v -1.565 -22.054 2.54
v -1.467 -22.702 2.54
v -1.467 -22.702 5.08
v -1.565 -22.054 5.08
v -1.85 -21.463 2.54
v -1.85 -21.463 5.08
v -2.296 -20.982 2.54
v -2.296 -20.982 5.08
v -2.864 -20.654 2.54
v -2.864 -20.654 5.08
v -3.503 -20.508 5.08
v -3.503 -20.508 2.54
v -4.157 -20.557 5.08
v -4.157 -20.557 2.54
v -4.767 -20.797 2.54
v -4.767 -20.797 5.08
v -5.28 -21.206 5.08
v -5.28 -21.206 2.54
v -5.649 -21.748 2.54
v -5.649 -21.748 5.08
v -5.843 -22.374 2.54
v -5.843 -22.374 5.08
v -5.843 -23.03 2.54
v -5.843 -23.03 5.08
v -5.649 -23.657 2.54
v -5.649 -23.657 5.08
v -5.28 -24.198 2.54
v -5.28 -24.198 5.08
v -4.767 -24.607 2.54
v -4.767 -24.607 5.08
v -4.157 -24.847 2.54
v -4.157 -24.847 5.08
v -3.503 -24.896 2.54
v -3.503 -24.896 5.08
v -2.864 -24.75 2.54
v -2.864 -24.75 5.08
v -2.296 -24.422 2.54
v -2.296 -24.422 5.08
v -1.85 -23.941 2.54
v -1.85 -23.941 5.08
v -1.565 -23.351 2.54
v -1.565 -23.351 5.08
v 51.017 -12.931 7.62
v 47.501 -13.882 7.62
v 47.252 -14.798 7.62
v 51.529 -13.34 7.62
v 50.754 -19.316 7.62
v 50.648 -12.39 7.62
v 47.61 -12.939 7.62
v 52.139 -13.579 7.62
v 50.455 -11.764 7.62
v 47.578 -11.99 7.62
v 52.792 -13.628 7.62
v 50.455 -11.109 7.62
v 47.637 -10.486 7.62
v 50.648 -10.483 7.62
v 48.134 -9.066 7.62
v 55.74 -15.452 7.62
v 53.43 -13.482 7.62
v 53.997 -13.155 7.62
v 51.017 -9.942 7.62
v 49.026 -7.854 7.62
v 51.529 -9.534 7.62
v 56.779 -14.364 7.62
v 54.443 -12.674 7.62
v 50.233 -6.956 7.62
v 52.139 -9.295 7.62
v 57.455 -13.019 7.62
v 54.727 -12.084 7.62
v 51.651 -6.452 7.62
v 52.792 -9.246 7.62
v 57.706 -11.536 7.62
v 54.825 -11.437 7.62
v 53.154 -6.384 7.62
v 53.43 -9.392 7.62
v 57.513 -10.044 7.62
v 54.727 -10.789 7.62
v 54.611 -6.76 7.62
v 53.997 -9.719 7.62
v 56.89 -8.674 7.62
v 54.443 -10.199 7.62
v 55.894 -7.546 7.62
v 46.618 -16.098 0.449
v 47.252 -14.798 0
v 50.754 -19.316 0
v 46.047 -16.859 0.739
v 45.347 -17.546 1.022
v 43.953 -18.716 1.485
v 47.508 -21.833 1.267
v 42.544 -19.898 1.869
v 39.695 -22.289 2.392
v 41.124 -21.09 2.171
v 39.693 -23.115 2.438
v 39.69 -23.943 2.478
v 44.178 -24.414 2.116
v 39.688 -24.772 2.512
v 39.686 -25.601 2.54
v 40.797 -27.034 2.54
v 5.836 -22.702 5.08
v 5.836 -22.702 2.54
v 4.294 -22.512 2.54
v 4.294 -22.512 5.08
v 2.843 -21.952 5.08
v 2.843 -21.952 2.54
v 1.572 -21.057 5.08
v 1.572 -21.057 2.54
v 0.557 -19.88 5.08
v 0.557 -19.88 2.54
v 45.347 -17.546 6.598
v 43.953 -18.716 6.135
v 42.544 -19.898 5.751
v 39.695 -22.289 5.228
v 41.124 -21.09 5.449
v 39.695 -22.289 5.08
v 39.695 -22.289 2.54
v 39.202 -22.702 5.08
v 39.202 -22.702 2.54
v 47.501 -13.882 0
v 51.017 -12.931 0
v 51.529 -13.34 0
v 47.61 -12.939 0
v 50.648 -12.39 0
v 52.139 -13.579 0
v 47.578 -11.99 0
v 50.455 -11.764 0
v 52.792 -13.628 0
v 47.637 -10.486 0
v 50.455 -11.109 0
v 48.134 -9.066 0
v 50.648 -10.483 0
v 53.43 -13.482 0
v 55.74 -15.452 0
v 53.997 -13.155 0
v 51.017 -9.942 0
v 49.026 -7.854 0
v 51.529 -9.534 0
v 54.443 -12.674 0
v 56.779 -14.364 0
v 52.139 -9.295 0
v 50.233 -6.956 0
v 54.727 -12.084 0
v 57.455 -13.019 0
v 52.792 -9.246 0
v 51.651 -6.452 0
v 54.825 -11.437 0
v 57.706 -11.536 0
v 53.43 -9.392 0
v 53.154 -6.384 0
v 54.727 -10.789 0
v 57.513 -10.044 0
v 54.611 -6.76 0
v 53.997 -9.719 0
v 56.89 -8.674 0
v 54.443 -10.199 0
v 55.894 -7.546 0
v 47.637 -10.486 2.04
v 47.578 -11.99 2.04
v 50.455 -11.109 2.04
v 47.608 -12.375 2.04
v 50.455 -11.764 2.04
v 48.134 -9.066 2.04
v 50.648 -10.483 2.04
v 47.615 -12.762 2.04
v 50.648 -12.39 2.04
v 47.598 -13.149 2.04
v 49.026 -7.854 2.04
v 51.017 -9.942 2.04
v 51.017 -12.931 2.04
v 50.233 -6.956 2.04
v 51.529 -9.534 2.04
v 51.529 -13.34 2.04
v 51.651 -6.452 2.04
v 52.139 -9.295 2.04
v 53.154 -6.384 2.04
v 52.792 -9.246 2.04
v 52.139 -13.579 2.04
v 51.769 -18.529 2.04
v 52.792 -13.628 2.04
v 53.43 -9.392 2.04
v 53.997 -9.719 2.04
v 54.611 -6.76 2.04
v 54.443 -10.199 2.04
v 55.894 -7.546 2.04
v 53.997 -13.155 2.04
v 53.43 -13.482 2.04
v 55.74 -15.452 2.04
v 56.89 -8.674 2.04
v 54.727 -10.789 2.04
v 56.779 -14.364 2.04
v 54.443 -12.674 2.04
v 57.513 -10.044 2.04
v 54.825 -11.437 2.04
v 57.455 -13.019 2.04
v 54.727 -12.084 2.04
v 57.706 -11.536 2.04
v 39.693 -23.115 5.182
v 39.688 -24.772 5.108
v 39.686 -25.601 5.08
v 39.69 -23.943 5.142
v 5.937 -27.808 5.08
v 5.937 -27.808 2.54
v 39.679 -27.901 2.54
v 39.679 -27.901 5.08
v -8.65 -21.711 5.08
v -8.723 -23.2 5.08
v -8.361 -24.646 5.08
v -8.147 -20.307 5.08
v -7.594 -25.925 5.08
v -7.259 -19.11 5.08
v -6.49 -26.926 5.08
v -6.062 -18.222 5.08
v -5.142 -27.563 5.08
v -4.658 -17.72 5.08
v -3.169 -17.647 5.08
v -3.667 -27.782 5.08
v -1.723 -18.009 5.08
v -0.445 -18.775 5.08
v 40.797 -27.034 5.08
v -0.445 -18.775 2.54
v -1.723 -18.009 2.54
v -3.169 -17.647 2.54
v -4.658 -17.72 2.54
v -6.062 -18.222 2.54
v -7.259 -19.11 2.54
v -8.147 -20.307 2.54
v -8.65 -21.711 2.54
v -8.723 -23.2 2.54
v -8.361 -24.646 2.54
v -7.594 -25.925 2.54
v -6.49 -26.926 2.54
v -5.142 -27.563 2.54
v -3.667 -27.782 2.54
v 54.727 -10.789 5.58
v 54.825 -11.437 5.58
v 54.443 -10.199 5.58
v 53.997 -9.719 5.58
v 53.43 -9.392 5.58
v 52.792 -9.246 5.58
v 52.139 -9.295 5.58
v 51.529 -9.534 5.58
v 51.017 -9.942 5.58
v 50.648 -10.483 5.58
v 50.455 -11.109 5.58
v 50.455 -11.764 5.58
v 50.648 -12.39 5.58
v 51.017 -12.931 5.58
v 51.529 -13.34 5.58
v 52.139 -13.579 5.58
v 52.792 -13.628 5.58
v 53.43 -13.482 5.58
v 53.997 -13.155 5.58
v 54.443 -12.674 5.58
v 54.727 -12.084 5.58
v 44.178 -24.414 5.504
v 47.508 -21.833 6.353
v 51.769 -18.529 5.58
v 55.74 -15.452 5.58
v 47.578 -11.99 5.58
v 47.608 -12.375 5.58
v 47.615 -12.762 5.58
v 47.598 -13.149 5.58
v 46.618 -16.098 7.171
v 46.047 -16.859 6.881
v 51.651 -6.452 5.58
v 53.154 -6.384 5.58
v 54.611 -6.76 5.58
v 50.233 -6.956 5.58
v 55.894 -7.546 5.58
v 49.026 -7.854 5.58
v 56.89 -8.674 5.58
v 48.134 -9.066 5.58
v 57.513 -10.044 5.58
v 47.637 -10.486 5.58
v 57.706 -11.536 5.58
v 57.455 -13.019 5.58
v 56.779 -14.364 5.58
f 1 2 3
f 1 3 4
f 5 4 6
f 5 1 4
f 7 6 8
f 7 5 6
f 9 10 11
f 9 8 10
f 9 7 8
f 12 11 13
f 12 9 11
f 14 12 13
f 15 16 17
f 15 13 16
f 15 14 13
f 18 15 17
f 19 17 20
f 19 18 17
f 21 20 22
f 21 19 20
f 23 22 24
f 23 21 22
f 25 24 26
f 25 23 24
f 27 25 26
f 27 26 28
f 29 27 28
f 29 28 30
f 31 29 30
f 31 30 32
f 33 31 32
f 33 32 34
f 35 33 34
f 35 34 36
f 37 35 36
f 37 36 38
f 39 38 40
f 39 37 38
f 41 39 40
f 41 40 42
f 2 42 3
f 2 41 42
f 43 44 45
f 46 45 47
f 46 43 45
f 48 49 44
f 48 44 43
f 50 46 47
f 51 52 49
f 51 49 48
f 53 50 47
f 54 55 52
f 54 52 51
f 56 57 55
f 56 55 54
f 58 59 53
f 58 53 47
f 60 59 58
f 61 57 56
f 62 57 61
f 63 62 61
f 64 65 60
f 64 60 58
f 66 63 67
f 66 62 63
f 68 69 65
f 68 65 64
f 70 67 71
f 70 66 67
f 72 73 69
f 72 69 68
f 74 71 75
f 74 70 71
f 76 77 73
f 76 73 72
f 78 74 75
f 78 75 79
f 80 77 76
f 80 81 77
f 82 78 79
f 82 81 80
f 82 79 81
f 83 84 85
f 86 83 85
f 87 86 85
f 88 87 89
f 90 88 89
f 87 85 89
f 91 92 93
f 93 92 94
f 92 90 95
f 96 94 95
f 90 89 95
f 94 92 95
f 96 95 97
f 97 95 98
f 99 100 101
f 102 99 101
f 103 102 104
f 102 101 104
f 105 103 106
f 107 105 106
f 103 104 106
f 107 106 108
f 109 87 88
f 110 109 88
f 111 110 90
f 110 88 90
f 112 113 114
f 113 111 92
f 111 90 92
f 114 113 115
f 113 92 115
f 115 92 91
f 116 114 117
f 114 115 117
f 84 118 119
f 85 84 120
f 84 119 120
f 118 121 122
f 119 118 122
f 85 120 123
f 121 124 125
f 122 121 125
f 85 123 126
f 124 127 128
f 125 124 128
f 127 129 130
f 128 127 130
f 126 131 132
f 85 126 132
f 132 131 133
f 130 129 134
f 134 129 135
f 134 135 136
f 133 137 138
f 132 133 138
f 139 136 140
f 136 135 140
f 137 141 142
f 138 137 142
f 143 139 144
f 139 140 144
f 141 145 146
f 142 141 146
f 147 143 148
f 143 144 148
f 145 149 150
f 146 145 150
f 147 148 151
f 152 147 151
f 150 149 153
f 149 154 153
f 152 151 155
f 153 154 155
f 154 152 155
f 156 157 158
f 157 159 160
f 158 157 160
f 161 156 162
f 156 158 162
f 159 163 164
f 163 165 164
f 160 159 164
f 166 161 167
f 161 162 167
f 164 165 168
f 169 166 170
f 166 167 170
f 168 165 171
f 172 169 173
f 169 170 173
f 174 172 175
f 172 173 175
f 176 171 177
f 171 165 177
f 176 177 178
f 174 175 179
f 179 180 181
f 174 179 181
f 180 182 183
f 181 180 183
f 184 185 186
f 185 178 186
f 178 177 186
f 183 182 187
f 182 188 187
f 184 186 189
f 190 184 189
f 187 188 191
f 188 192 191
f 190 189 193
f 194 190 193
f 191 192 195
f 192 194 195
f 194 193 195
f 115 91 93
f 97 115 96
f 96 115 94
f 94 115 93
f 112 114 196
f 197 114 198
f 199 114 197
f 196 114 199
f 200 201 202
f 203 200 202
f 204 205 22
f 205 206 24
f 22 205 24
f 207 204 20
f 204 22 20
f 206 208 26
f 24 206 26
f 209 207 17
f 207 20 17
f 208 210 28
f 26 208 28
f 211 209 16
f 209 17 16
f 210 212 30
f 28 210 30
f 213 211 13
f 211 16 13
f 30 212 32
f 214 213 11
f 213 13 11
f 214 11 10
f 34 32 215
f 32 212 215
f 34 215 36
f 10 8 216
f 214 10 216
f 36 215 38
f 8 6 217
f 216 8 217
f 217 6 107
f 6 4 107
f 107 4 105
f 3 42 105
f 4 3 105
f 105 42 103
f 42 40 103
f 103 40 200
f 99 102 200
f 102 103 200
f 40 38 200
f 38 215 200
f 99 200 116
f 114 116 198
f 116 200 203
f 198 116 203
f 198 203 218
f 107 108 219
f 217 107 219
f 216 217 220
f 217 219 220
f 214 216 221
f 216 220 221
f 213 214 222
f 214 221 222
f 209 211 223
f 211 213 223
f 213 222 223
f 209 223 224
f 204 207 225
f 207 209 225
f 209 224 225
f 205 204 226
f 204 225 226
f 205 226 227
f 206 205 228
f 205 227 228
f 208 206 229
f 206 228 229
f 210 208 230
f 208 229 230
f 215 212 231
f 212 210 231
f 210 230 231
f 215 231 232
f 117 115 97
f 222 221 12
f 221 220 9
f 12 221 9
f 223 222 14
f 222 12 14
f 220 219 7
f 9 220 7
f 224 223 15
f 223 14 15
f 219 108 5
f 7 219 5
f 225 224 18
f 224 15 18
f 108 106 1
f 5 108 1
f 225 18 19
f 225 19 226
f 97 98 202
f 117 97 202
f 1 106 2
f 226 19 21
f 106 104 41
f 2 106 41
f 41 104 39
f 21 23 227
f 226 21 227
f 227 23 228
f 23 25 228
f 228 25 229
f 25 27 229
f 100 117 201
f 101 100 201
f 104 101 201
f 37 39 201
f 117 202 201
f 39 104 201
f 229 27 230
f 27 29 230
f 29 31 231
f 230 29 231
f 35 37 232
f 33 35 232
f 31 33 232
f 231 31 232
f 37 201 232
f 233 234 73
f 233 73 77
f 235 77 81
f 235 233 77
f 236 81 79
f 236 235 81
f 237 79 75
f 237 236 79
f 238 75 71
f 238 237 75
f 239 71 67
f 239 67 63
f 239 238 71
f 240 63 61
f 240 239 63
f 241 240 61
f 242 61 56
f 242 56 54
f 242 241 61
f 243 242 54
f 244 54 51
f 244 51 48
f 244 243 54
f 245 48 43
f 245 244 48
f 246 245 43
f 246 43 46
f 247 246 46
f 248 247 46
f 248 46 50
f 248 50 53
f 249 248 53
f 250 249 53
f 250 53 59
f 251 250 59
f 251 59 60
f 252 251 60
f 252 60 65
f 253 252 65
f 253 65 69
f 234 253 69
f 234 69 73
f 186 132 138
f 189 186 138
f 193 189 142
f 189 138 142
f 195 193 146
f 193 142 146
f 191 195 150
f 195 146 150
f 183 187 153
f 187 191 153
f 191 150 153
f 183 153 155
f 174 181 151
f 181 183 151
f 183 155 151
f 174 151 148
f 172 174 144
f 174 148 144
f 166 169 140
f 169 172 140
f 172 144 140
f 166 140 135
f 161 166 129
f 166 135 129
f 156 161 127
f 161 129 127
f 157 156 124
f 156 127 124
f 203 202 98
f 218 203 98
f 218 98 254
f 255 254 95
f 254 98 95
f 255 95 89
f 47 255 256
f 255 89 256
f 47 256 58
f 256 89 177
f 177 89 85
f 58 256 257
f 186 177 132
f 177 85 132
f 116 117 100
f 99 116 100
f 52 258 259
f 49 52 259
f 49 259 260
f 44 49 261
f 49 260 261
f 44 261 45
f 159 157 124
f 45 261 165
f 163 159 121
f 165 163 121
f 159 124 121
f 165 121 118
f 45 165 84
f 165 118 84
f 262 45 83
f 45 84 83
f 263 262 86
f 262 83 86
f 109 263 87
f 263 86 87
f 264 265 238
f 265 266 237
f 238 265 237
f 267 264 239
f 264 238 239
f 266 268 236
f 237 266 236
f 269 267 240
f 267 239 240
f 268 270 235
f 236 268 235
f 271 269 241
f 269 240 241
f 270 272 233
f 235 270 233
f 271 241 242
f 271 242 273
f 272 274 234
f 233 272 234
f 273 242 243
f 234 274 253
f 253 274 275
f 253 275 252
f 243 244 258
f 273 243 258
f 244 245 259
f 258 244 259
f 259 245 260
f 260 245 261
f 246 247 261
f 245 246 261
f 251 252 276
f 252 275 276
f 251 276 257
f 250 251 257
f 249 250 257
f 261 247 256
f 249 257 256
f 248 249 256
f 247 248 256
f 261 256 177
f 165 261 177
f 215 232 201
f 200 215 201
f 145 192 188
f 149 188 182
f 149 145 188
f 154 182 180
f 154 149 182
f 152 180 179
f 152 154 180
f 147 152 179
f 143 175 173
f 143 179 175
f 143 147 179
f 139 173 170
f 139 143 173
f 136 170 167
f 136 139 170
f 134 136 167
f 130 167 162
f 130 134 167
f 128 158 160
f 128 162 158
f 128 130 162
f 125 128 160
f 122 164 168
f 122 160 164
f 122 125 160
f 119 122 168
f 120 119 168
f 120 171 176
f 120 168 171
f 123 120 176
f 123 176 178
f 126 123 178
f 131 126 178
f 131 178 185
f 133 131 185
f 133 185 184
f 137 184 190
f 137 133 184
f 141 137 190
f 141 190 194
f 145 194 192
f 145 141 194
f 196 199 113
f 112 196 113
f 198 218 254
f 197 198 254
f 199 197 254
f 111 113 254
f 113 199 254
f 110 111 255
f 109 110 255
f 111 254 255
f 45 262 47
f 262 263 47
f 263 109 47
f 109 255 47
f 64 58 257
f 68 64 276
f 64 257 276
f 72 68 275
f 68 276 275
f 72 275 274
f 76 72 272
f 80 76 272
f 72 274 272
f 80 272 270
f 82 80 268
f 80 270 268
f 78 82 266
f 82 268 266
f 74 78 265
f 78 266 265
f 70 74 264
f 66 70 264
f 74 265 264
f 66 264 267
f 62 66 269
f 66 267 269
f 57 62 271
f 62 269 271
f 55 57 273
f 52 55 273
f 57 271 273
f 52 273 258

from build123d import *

# Parameters (mm, degrees)
F0_R     = 2.2
F0_R_2   = 2.1971
F1_DEPTH = 7.62
F2_W     = 8.5971400267
F2_H     = 2.54
F2_W_2   = 43.3469019601
F3_DEPTH = 12.7
F5_DEPTH = 25.4


with BuildPart() as f1:
    # F0 (on Top) → F1 (new body)
    with BuildSketch(Plane.XY):
        with BuildLine():
            Line((5.9369556572, -27.8083572605), (39.6794228829, -27.9006065895))
            Line((39.6794228829, -27.9006065895), (55.7396312141, -15.4518271971))
            ThreePointArc((55.7396312141, -15.4518271971), (54.6110684248, -6.7600664581), (47.5776399311, -11.9899079794))
            ThreePointArc((47.5776399311, -11.9899079794), (47.1582083615, -15.0471734784), (45.347095709, -17.5457062744))
            Line((45.347095709, -17.5457062744), (39.2019450665, -22.7020999121))
            Line((39.2019450665, -22.7020999121), (5.8364926789, -22.7020999121))
            ThreePointArc((5.8364926789, -22.7020999121), (2.8430739719, -21.9522735206), (0.5565983665, -19.8798776899))
            ThreePointArc((0.5565983665, -19.8798776899), (-8.1474559702, -20.3073649465), (-3.6673170835, -27.7820999121))
            Line((-3.6673170835, -27.7820999121), (5.9369556572, -27.8083572605))
        make_face()
        with Locations((-3.6673170835, -22.7020999121)):
            Circle(F0_R, mode=Mode.SUBTRACT)
        with Locations((52.627436366, -11.4367751143)):
            Circle(F0_R_2, mode=Mode.SUBTRACT)
    extrude(amount=F1_DEPTH)

    # F2 (on face) → F3 (cut, symmetric)
    with BuildSketch(Plane(origin=(-0.0759809827, -27.7919183508, 0), x_dir=(0.9999962629, -0.0027339134, 0), z_dir=(-0.0027339134, -0.9999962629, 0))):
        with Locations((-7.8899195355, 1.27)):
            Rectangle(F2_W, F2_H)
        with Locations((18.0821014579, 1.27)):
            Rectangle(F2_W_2, F2_H)
        with Locations((-7.8899195355, 6.35)):
            Rectangle(F2_W, F2_H)
        with Locations((18.0821014579, 6.35)):
            Rectangle(F2_W_2, F2_H)
    extrude(amount=F3_DEPTH, both=True, mode=Mode.SUBTRACT)

    # F4 (on face) → F5 (cut)
    with BuildSketch(Plane(origin=(28.4022854633, -36.6418752591, 0), x_dir=(0.7903645832, 0.6126367811, 0), z_dir=(0.6126367811, -0.7903645832, 0))):
        with BuildLine():
            Line((14.2682727173, 5.08), (15.6822027681, 5.08))
            ThreePointArc((15.6822027681, 5.08), (22.0769997922, 5.8758387603), (28.2806027681, 7.62))
            Line((28.2806027681, 7.62), (14.2682727173, 7.62))
            Line((14.2682727173, 7.62), (14.2682727173, 5.08))
        make_face()
        Polygon((34.5882727173, 2.04), (34.5882727173, 5.58), (29.5646376908, 5.58), (29.5646376908, 5.08), (29.5646376908, 4.3004048057), (29.5646376908, 3.3195951943), (29.5646376908, 2.54), (29.5646376908, 2.04), align=None)
        Polygon((41.6956804693, 5.58), (34.5882727173, 5.58), (34.5882727173, 2.04), (41.6956804693, 2.04), (42.2389656305, 2.04), (42.2389656305, 2.54), (42.2389656305, 3.4030259121), (42.2389656305, 4.2169740879), (42.2389656305, 5.08), (42.2389656305, 5.58), align=None)
        with BuildLine():
            Line((15.6822027681, 2.54), (14.2682727173, 2.54))
            Line((14.2682727173, 2.54), (14.2682727173, 0))
            Line((14.2682727173, 0), (28.2806027681, 0))
            ThreePointArc((28.2806027681, 0), (22.0769997922, 1.7441612397), (15.6822027681, 2.54))
        make_face()
    extrude(amount=-F5_DEPTH, mode=Mode.SUBTRACT)


solid = f1.part
